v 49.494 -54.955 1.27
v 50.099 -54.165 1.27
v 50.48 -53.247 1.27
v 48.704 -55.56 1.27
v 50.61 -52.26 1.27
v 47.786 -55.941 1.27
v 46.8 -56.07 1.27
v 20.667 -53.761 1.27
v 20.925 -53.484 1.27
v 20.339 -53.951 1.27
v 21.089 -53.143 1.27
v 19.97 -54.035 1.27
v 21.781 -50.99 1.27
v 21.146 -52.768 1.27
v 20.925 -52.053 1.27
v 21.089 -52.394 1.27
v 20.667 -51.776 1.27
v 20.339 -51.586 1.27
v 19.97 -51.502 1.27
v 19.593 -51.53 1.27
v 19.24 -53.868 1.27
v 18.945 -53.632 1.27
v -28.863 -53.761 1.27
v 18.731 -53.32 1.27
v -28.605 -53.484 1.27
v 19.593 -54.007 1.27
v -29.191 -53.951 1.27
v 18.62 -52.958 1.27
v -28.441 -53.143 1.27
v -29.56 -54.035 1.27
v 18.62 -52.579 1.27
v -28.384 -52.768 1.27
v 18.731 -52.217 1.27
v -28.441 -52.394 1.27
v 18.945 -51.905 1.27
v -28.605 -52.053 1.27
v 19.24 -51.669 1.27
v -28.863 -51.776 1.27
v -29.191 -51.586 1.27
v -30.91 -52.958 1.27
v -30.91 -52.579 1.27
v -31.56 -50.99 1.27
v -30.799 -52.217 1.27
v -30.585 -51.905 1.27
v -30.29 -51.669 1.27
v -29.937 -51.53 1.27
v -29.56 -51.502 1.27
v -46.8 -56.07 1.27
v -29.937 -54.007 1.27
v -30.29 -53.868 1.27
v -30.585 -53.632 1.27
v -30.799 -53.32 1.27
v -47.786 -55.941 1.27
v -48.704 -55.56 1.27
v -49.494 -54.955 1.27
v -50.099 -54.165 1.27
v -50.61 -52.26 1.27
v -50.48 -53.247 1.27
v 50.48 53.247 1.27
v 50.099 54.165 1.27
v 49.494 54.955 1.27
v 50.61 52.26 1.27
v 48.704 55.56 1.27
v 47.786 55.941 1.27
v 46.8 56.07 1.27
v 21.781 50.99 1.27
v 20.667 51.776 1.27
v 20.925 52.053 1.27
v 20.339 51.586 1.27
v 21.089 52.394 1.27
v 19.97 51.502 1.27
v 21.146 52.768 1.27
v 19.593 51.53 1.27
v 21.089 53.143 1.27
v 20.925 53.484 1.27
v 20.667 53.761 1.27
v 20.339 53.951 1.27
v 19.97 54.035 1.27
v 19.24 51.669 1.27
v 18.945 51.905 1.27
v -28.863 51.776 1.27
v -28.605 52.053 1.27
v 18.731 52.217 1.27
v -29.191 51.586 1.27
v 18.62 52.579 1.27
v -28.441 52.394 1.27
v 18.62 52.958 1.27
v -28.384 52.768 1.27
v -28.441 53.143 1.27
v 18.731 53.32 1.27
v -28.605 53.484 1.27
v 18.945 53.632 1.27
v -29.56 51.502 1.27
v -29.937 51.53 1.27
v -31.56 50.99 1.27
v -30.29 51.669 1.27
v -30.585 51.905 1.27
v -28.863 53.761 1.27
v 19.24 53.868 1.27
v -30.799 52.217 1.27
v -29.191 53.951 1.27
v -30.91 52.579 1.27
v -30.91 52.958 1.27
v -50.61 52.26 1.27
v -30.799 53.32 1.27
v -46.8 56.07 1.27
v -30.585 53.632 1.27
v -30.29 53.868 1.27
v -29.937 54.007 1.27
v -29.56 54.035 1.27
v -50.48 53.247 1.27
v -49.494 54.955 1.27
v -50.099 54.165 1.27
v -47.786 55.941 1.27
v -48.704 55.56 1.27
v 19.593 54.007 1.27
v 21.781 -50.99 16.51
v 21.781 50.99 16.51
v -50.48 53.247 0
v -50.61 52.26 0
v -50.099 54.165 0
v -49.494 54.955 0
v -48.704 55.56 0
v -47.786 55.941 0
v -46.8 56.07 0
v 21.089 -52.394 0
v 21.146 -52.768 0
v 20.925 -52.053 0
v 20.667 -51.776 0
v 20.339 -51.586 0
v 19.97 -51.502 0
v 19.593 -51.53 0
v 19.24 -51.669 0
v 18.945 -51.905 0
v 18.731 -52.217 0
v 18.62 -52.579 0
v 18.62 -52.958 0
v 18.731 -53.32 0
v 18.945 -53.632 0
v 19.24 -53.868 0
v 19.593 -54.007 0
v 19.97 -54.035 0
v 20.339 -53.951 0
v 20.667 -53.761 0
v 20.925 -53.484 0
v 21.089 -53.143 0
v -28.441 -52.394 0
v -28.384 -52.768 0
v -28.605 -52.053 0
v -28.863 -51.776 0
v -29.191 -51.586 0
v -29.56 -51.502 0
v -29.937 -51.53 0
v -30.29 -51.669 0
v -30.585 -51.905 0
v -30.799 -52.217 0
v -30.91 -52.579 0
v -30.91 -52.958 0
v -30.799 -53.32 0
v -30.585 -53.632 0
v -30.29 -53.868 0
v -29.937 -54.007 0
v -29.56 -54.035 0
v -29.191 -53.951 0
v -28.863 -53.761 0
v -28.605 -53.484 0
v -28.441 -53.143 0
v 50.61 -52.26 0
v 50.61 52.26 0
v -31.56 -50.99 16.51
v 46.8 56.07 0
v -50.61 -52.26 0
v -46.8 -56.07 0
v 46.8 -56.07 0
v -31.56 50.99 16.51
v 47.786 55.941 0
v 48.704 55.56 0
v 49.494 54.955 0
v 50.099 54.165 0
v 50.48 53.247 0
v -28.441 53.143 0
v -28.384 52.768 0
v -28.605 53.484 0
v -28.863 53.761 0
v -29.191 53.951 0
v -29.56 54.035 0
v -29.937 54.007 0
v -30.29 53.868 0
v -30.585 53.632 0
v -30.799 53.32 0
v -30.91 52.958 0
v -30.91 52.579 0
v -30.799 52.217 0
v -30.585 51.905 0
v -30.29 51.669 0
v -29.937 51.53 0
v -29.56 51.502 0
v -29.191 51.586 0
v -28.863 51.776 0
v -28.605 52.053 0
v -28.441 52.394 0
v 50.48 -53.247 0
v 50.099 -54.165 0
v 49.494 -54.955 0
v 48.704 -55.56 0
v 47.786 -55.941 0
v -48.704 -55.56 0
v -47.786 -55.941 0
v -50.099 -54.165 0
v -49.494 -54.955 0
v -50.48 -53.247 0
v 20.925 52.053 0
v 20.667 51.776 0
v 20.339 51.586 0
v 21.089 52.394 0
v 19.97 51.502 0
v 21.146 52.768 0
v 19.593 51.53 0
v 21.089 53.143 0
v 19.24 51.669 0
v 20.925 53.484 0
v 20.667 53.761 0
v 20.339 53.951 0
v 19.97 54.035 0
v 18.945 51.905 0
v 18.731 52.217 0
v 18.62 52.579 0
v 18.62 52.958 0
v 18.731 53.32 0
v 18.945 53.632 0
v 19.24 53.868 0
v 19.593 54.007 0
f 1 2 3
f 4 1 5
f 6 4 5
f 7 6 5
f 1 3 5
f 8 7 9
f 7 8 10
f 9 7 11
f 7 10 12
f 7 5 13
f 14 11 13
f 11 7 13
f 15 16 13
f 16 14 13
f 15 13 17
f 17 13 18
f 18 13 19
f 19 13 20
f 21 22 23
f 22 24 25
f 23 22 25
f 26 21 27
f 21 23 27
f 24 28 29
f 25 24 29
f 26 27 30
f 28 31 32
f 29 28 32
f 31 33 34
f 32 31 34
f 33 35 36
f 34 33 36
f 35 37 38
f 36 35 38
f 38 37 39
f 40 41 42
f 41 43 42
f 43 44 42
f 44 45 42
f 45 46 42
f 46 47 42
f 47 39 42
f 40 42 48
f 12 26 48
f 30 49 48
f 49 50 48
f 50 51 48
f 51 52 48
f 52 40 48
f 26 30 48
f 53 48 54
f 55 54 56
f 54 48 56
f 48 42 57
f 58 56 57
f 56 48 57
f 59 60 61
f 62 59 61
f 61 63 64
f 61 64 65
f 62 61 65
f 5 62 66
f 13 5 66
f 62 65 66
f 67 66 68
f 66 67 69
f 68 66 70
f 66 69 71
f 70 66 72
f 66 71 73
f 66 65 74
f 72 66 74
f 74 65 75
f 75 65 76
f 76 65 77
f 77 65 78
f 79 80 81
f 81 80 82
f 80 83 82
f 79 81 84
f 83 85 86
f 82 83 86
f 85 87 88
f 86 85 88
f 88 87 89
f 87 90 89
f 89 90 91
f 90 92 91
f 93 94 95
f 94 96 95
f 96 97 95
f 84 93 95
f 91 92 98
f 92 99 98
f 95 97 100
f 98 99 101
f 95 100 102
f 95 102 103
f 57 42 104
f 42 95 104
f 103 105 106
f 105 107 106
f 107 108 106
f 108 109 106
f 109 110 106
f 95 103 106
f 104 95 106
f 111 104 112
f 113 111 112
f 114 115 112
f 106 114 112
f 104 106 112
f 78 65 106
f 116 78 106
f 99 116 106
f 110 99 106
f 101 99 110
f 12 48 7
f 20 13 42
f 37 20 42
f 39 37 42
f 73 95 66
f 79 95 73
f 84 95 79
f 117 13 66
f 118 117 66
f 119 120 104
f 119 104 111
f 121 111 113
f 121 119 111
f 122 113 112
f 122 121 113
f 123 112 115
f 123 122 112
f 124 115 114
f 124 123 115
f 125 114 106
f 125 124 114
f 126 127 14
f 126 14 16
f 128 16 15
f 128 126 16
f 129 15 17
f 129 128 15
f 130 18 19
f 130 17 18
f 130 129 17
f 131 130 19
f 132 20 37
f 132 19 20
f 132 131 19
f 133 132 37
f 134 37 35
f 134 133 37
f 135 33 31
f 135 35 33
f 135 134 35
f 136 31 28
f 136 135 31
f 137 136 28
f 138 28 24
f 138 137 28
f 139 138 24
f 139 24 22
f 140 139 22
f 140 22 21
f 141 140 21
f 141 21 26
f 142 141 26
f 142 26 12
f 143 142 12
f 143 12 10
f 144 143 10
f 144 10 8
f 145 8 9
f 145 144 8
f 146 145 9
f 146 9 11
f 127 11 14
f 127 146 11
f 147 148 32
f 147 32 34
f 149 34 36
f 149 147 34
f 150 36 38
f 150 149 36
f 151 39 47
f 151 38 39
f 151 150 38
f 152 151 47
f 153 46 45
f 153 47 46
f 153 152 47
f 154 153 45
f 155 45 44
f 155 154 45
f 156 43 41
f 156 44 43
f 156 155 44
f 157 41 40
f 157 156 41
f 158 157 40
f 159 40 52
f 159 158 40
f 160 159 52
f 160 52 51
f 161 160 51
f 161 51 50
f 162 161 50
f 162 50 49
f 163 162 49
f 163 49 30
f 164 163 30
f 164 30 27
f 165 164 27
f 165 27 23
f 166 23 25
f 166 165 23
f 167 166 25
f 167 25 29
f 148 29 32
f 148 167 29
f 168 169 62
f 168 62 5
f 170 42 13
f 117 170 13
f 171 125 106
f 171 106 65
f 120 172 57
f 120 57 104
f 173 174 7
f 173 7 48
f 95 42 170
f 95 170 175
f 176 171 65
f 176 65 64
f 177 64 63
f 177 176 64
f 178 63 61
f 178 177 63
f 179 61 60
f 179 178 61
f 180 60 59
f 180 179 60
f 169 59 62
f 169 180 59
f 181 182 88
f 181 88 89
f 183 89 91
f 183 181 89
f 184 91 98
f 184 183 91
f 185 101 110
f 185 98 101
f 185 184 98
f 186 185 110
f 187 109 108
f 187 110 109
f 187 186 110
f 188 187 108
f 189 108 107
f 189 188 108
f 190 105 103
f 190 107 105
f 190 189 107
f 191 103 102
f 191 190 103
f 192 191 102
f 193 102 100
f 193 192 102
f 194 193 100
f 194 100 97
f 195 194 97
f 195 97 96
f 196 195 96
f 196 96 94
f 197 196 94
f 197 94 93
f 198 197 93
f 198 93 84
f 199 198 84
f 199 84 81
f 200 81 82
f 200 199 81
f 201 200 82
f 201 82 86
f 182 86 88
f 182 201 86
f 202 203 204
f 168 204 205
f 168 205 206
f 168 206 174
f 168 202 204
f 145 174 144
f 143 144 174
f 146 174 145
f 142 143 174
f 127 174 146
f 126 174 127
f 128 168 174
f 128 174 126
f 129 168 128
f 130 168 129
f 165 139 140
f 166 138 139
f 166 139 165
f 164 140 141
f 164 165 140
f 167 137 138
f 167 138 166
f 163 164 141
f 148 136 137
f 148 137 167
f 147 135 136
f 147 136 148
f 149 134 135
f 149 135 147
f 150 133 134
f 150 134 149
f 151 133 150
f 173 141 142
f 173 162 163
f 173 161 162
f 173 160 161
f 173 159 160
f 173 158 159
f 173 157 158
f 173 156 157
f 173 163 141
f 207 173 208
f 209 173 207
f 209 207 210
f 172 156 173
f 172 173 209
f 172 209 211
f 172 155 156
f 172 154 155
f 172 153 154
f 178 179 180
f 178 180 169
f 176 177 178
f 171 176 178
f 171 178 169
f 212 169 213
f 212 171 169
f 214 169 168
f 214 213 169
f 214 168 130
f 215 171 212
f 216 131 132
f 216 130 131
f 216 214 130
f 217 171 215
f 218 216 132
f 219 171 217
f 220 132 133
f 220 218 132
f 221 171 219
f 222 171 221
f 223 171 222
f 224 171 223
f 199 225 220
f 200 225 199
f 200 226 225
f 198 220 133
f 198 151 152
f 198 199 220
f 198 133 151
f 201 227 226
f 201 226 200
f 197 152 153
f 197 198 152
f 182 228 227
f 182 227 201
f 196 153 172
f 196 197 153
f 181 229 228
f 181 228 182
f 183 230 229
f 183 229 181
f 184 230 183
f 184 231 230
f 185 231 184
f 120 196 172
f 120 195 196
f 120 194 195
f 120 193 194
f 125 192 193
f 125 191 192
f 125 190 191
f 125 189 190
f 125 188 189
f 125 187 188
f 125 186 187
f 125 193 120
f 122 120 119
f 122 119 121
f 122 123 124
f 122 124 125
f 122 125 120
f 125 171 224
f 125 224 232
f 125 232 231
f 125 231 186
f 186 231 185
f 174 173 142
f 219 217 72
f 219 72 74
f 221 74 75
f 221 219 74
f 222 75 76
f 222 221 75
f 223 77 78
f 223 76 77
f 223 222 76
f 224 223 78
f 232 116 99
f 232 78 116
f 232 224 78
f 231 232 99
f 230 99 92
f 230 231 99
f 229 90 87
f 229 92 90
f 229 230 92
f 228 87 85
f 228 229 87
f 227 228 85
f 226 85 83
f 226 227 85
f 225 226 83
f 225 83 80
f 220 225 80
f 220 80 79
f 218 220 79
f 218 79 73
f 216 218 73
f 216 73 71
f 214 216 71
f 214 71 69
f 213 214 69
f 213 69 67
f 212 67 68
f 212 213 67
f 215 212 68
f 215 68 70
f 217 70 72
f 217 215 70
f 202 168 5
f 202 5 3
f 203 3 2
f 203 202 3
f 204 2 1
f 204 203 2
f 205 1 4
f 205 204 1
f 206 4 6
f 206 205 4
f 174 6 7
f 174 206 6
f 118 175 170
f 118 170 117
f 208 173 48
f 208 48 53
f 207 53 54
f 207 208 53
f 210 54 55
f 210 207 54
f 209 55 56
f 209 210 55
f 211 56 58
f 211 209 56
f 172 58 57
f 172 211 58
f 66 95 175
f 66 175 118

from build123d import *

# Parameters (mm, degrees)
BOSS_EXTRUDE1_DEPTH     = 1.27
SKETCH2_W               = 53.34
SKETCH2_H               = 101.981
BOSS_EXTRUDE2_DEPTH     = 15.24
CUT_EXTRUDE1_DEPTH      = 78.055045652
CUT_EXTRUDE1_DEPTH_BACK = 78.055045652
SKETCH4_R               = 1.27


with BuildPart() as part:
    # Sketch1 → Boss-Extrude1 (new body)
    with BuildSketch(Plane.XY):
        with BuildLine():
            Line((-46.7995, 56.0705), (46.7995, 56.0705))
            ThreePointArc((46.7995, 56.0705), (49.493576836, 54.954576836), (50.6095, 52.2605))
            Line((50.6095, 52.2605), (50.6095, -52.2605))
            ThreePointArc((50.6095, -52.2605), (49.493576836, -54.954576836), (46.7995, -56.0705))
            Line((46.7995, -56.0705), (-46.7995, -56.0705))
            ThreePointArc((-46.7995, -56.0705), (-49.493576836, -54.954576836), (-50.6095, -52.2605))
            Line((-50.6095, -52.2605), (-50.6095, 52.2605))
            ThreePointArc((-50.6095, 52.2605), (-49.493576836, 54.954576836), (-46.7995, 56.0705))
        make_face()
    extrude(amount=BOSS_EXTRUDE1_DEPTH)

    # Sketch2 → Boss-Extrude2 (add)
    with BuildSketch(Plane.XY.offset(1.27)):
        with Locations((-4.8895, 0)):
            Rectangle(SKETCH2_W, SKETCH2_H)
    extrude(amount=BOSS_EXTRUDE2_DEPTH)

    # Sketch4 → Cut-Extrude1 (cut, two sides: drawn at the far end of the back side and taken through both)
    with BuildSketch(Plane.XY.offset(1.27).offset(-CUT_EXTRUDE1_DEPTH_BACK)):
        with Locations((-29.6545, 52.7685)):
            Circle(SKETCH4_R)
        with Locations((19.8755, 52.7685)):
            Circle(SKETCH4_R)
        with Locations((-29.6545, -52.7685)):
            Circle(SKETCH4_R)
        with Locations((19.8755, -52.7685)):
            Circle(SKETCH4_R)
    extrude(amount=CUT_EXTRUDE1_DEPTH + CUT_EXTRUDE1_DEPTH_BACK, mode=Mode.SUBTRACT)


solid = part.part
